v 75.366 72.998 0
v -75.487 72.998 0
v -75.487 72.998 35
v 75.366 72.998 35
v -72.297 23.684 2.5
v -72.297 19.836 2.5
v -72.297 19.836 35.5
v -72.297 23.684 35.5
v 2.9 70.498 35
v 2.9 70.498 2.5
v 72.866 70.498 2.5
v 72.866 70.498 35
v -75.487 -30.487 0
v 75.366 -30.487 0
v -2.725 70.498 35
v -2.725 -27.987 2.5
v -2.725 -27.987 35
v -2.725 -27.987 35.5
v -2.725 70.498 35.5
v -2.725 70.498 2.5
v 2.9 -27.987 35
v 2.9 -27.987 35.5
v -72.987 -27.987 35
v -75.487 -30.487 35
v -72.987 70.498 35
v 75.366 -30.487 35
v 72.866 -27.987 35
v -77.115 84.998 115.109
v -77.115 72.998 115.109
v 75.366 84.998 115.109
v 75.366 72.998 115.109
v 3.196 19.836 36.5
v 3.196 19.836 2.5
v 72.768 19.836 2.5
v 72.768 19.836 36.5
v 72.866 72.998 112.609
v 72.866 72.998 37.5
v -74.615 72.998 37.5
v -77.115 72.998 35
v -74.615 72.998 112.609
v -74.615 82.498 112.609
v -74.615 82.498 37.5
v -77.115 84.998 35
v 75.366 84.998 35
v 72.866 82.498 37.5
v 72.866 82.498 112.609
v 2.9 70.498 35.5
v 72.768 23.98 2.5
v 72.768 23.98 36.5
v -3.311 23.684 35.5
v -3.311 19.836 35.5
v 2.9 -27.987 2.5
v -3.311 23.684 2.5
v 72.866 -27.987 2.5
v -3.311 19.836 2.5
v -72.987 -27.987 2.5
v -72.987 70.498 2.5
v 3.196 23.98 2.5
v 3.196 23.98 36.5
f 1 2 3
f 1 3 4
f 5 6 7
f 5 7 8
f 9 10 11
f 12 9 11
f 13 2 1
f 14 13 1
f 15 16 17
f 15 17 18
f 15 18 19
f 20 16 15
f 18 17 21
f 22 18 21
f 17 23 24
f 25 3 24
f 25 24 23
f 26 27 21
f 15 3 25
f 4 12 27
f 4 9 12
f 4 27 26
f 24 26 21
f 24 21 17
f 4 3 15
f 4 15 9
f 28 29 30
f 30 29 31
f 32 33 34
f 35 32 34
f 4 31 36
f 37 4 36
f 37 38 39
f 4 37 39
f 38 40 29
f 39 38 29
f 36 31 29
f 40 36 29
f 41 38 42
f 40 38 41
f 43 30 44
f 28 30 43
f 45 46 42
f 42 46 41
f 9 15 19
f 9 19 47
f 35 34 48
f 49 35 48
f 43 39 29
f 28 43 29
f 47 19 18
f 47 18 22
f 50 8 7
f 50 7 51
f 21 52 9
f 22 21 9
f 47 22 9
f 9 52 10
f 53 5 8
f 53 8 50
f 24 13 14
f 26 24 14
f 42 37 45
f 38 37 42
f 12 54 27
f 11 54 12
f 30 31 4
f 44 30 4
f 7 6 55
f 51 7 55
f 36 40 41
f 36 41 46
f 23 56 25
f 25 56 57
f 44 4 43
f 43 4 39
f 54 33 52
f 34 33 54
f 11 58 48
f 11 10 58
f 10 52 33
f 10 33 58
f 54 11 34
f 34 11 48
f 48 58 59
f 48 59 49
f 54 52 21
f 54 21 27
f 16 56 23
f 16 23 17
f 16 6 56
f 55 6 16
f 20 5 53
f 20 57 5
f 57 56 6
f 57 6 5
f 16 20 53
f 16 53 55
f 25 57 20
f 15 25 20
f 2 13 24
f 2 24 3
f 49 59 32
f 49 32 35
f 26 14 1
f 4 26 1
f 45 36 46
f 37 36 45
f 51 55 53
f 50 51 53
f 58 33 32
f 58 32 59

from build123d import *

# Parameters (mm, degrees)
F0_W      = 150.853216
F0_H      = 103.484783
F1_DEPTH  = 35
F2_T      = -2.5
F3_W      = 5.625002
F3_H      = 98.484783
F6_DEPTH  = 33
F5_W      = 69.572369
F5_H      = 4.144738
F7_DEPTH  = 34
F4_W      = 68.985967
F4_H      = 3.848685
F8_DEPTH  = 33
F10_DEPTH = 12
F11_T     = -2.5


with BuildPart() as f1:
    # F0 (on Top) → F1 (new body)
    with BuildSketch(Plane.XY):
        with Locations((-0.060469, 21.255313)):
            Rectangle(F0_W, F0_H)
    extrude(amount=F1_DEPTH)

    # F2
    f2_openings = [f1.faces().sort_by_distance(p)[0] for p in [
        (-0.060469, 21.255312, 35),
    ]]
    offset(amount=F2_T, openings=f2_openings)

    # F3 (on face) → F6 (join)
    with BuildSketch(Plane.XY.offset(2.5)):
        with Locations((0.087558, 21.255313)):
            Rectangle(F3_W, F3_H)
    extrude(amount=F6_DEPTH)

    # F5 (on face) → F7 (join)
    with BuildSketch(Plane.XY.offset(2.5)):
        with Locations((37.982295, 21.907895)):
            Rectangle(F5_W, F5_H)
    extrude(amount=F7_DEPTH)

    # F4 (on face) → F8 (join)
    with BuildSketch(Plane.XY.offset(2.5)):
        with Locations((-37.804328, 21.759868)):
            Rectangle(F4_W, F4_H)
    extrude(amount=F8_DEPTH)


with BuildPart() as f10:
    # F9 (on face) → F10 (new body)
    with BuildSketch(Plane(origin=(0, 72.997704, 0), x_dir=(-1, 0, 0), z_dir=(0, 1, 0))):
        Polygon((-75.366139, 115.108758), (-75.366139, 35), (75.487077, 35), (77.114932, 35), (77.114932, 115.108758), align=None)
    extrude(amount=F10_DEPTH)

    # F11
    f11_openings = [f10.faces().sort_by_distance(p)[0] for p in [
        (-0.874396, 72.997704, 75.054379),
    ]]
    offset(amount=F11_T, openings=f11_openings)


solid = Compound([f1.part, f10.part])
